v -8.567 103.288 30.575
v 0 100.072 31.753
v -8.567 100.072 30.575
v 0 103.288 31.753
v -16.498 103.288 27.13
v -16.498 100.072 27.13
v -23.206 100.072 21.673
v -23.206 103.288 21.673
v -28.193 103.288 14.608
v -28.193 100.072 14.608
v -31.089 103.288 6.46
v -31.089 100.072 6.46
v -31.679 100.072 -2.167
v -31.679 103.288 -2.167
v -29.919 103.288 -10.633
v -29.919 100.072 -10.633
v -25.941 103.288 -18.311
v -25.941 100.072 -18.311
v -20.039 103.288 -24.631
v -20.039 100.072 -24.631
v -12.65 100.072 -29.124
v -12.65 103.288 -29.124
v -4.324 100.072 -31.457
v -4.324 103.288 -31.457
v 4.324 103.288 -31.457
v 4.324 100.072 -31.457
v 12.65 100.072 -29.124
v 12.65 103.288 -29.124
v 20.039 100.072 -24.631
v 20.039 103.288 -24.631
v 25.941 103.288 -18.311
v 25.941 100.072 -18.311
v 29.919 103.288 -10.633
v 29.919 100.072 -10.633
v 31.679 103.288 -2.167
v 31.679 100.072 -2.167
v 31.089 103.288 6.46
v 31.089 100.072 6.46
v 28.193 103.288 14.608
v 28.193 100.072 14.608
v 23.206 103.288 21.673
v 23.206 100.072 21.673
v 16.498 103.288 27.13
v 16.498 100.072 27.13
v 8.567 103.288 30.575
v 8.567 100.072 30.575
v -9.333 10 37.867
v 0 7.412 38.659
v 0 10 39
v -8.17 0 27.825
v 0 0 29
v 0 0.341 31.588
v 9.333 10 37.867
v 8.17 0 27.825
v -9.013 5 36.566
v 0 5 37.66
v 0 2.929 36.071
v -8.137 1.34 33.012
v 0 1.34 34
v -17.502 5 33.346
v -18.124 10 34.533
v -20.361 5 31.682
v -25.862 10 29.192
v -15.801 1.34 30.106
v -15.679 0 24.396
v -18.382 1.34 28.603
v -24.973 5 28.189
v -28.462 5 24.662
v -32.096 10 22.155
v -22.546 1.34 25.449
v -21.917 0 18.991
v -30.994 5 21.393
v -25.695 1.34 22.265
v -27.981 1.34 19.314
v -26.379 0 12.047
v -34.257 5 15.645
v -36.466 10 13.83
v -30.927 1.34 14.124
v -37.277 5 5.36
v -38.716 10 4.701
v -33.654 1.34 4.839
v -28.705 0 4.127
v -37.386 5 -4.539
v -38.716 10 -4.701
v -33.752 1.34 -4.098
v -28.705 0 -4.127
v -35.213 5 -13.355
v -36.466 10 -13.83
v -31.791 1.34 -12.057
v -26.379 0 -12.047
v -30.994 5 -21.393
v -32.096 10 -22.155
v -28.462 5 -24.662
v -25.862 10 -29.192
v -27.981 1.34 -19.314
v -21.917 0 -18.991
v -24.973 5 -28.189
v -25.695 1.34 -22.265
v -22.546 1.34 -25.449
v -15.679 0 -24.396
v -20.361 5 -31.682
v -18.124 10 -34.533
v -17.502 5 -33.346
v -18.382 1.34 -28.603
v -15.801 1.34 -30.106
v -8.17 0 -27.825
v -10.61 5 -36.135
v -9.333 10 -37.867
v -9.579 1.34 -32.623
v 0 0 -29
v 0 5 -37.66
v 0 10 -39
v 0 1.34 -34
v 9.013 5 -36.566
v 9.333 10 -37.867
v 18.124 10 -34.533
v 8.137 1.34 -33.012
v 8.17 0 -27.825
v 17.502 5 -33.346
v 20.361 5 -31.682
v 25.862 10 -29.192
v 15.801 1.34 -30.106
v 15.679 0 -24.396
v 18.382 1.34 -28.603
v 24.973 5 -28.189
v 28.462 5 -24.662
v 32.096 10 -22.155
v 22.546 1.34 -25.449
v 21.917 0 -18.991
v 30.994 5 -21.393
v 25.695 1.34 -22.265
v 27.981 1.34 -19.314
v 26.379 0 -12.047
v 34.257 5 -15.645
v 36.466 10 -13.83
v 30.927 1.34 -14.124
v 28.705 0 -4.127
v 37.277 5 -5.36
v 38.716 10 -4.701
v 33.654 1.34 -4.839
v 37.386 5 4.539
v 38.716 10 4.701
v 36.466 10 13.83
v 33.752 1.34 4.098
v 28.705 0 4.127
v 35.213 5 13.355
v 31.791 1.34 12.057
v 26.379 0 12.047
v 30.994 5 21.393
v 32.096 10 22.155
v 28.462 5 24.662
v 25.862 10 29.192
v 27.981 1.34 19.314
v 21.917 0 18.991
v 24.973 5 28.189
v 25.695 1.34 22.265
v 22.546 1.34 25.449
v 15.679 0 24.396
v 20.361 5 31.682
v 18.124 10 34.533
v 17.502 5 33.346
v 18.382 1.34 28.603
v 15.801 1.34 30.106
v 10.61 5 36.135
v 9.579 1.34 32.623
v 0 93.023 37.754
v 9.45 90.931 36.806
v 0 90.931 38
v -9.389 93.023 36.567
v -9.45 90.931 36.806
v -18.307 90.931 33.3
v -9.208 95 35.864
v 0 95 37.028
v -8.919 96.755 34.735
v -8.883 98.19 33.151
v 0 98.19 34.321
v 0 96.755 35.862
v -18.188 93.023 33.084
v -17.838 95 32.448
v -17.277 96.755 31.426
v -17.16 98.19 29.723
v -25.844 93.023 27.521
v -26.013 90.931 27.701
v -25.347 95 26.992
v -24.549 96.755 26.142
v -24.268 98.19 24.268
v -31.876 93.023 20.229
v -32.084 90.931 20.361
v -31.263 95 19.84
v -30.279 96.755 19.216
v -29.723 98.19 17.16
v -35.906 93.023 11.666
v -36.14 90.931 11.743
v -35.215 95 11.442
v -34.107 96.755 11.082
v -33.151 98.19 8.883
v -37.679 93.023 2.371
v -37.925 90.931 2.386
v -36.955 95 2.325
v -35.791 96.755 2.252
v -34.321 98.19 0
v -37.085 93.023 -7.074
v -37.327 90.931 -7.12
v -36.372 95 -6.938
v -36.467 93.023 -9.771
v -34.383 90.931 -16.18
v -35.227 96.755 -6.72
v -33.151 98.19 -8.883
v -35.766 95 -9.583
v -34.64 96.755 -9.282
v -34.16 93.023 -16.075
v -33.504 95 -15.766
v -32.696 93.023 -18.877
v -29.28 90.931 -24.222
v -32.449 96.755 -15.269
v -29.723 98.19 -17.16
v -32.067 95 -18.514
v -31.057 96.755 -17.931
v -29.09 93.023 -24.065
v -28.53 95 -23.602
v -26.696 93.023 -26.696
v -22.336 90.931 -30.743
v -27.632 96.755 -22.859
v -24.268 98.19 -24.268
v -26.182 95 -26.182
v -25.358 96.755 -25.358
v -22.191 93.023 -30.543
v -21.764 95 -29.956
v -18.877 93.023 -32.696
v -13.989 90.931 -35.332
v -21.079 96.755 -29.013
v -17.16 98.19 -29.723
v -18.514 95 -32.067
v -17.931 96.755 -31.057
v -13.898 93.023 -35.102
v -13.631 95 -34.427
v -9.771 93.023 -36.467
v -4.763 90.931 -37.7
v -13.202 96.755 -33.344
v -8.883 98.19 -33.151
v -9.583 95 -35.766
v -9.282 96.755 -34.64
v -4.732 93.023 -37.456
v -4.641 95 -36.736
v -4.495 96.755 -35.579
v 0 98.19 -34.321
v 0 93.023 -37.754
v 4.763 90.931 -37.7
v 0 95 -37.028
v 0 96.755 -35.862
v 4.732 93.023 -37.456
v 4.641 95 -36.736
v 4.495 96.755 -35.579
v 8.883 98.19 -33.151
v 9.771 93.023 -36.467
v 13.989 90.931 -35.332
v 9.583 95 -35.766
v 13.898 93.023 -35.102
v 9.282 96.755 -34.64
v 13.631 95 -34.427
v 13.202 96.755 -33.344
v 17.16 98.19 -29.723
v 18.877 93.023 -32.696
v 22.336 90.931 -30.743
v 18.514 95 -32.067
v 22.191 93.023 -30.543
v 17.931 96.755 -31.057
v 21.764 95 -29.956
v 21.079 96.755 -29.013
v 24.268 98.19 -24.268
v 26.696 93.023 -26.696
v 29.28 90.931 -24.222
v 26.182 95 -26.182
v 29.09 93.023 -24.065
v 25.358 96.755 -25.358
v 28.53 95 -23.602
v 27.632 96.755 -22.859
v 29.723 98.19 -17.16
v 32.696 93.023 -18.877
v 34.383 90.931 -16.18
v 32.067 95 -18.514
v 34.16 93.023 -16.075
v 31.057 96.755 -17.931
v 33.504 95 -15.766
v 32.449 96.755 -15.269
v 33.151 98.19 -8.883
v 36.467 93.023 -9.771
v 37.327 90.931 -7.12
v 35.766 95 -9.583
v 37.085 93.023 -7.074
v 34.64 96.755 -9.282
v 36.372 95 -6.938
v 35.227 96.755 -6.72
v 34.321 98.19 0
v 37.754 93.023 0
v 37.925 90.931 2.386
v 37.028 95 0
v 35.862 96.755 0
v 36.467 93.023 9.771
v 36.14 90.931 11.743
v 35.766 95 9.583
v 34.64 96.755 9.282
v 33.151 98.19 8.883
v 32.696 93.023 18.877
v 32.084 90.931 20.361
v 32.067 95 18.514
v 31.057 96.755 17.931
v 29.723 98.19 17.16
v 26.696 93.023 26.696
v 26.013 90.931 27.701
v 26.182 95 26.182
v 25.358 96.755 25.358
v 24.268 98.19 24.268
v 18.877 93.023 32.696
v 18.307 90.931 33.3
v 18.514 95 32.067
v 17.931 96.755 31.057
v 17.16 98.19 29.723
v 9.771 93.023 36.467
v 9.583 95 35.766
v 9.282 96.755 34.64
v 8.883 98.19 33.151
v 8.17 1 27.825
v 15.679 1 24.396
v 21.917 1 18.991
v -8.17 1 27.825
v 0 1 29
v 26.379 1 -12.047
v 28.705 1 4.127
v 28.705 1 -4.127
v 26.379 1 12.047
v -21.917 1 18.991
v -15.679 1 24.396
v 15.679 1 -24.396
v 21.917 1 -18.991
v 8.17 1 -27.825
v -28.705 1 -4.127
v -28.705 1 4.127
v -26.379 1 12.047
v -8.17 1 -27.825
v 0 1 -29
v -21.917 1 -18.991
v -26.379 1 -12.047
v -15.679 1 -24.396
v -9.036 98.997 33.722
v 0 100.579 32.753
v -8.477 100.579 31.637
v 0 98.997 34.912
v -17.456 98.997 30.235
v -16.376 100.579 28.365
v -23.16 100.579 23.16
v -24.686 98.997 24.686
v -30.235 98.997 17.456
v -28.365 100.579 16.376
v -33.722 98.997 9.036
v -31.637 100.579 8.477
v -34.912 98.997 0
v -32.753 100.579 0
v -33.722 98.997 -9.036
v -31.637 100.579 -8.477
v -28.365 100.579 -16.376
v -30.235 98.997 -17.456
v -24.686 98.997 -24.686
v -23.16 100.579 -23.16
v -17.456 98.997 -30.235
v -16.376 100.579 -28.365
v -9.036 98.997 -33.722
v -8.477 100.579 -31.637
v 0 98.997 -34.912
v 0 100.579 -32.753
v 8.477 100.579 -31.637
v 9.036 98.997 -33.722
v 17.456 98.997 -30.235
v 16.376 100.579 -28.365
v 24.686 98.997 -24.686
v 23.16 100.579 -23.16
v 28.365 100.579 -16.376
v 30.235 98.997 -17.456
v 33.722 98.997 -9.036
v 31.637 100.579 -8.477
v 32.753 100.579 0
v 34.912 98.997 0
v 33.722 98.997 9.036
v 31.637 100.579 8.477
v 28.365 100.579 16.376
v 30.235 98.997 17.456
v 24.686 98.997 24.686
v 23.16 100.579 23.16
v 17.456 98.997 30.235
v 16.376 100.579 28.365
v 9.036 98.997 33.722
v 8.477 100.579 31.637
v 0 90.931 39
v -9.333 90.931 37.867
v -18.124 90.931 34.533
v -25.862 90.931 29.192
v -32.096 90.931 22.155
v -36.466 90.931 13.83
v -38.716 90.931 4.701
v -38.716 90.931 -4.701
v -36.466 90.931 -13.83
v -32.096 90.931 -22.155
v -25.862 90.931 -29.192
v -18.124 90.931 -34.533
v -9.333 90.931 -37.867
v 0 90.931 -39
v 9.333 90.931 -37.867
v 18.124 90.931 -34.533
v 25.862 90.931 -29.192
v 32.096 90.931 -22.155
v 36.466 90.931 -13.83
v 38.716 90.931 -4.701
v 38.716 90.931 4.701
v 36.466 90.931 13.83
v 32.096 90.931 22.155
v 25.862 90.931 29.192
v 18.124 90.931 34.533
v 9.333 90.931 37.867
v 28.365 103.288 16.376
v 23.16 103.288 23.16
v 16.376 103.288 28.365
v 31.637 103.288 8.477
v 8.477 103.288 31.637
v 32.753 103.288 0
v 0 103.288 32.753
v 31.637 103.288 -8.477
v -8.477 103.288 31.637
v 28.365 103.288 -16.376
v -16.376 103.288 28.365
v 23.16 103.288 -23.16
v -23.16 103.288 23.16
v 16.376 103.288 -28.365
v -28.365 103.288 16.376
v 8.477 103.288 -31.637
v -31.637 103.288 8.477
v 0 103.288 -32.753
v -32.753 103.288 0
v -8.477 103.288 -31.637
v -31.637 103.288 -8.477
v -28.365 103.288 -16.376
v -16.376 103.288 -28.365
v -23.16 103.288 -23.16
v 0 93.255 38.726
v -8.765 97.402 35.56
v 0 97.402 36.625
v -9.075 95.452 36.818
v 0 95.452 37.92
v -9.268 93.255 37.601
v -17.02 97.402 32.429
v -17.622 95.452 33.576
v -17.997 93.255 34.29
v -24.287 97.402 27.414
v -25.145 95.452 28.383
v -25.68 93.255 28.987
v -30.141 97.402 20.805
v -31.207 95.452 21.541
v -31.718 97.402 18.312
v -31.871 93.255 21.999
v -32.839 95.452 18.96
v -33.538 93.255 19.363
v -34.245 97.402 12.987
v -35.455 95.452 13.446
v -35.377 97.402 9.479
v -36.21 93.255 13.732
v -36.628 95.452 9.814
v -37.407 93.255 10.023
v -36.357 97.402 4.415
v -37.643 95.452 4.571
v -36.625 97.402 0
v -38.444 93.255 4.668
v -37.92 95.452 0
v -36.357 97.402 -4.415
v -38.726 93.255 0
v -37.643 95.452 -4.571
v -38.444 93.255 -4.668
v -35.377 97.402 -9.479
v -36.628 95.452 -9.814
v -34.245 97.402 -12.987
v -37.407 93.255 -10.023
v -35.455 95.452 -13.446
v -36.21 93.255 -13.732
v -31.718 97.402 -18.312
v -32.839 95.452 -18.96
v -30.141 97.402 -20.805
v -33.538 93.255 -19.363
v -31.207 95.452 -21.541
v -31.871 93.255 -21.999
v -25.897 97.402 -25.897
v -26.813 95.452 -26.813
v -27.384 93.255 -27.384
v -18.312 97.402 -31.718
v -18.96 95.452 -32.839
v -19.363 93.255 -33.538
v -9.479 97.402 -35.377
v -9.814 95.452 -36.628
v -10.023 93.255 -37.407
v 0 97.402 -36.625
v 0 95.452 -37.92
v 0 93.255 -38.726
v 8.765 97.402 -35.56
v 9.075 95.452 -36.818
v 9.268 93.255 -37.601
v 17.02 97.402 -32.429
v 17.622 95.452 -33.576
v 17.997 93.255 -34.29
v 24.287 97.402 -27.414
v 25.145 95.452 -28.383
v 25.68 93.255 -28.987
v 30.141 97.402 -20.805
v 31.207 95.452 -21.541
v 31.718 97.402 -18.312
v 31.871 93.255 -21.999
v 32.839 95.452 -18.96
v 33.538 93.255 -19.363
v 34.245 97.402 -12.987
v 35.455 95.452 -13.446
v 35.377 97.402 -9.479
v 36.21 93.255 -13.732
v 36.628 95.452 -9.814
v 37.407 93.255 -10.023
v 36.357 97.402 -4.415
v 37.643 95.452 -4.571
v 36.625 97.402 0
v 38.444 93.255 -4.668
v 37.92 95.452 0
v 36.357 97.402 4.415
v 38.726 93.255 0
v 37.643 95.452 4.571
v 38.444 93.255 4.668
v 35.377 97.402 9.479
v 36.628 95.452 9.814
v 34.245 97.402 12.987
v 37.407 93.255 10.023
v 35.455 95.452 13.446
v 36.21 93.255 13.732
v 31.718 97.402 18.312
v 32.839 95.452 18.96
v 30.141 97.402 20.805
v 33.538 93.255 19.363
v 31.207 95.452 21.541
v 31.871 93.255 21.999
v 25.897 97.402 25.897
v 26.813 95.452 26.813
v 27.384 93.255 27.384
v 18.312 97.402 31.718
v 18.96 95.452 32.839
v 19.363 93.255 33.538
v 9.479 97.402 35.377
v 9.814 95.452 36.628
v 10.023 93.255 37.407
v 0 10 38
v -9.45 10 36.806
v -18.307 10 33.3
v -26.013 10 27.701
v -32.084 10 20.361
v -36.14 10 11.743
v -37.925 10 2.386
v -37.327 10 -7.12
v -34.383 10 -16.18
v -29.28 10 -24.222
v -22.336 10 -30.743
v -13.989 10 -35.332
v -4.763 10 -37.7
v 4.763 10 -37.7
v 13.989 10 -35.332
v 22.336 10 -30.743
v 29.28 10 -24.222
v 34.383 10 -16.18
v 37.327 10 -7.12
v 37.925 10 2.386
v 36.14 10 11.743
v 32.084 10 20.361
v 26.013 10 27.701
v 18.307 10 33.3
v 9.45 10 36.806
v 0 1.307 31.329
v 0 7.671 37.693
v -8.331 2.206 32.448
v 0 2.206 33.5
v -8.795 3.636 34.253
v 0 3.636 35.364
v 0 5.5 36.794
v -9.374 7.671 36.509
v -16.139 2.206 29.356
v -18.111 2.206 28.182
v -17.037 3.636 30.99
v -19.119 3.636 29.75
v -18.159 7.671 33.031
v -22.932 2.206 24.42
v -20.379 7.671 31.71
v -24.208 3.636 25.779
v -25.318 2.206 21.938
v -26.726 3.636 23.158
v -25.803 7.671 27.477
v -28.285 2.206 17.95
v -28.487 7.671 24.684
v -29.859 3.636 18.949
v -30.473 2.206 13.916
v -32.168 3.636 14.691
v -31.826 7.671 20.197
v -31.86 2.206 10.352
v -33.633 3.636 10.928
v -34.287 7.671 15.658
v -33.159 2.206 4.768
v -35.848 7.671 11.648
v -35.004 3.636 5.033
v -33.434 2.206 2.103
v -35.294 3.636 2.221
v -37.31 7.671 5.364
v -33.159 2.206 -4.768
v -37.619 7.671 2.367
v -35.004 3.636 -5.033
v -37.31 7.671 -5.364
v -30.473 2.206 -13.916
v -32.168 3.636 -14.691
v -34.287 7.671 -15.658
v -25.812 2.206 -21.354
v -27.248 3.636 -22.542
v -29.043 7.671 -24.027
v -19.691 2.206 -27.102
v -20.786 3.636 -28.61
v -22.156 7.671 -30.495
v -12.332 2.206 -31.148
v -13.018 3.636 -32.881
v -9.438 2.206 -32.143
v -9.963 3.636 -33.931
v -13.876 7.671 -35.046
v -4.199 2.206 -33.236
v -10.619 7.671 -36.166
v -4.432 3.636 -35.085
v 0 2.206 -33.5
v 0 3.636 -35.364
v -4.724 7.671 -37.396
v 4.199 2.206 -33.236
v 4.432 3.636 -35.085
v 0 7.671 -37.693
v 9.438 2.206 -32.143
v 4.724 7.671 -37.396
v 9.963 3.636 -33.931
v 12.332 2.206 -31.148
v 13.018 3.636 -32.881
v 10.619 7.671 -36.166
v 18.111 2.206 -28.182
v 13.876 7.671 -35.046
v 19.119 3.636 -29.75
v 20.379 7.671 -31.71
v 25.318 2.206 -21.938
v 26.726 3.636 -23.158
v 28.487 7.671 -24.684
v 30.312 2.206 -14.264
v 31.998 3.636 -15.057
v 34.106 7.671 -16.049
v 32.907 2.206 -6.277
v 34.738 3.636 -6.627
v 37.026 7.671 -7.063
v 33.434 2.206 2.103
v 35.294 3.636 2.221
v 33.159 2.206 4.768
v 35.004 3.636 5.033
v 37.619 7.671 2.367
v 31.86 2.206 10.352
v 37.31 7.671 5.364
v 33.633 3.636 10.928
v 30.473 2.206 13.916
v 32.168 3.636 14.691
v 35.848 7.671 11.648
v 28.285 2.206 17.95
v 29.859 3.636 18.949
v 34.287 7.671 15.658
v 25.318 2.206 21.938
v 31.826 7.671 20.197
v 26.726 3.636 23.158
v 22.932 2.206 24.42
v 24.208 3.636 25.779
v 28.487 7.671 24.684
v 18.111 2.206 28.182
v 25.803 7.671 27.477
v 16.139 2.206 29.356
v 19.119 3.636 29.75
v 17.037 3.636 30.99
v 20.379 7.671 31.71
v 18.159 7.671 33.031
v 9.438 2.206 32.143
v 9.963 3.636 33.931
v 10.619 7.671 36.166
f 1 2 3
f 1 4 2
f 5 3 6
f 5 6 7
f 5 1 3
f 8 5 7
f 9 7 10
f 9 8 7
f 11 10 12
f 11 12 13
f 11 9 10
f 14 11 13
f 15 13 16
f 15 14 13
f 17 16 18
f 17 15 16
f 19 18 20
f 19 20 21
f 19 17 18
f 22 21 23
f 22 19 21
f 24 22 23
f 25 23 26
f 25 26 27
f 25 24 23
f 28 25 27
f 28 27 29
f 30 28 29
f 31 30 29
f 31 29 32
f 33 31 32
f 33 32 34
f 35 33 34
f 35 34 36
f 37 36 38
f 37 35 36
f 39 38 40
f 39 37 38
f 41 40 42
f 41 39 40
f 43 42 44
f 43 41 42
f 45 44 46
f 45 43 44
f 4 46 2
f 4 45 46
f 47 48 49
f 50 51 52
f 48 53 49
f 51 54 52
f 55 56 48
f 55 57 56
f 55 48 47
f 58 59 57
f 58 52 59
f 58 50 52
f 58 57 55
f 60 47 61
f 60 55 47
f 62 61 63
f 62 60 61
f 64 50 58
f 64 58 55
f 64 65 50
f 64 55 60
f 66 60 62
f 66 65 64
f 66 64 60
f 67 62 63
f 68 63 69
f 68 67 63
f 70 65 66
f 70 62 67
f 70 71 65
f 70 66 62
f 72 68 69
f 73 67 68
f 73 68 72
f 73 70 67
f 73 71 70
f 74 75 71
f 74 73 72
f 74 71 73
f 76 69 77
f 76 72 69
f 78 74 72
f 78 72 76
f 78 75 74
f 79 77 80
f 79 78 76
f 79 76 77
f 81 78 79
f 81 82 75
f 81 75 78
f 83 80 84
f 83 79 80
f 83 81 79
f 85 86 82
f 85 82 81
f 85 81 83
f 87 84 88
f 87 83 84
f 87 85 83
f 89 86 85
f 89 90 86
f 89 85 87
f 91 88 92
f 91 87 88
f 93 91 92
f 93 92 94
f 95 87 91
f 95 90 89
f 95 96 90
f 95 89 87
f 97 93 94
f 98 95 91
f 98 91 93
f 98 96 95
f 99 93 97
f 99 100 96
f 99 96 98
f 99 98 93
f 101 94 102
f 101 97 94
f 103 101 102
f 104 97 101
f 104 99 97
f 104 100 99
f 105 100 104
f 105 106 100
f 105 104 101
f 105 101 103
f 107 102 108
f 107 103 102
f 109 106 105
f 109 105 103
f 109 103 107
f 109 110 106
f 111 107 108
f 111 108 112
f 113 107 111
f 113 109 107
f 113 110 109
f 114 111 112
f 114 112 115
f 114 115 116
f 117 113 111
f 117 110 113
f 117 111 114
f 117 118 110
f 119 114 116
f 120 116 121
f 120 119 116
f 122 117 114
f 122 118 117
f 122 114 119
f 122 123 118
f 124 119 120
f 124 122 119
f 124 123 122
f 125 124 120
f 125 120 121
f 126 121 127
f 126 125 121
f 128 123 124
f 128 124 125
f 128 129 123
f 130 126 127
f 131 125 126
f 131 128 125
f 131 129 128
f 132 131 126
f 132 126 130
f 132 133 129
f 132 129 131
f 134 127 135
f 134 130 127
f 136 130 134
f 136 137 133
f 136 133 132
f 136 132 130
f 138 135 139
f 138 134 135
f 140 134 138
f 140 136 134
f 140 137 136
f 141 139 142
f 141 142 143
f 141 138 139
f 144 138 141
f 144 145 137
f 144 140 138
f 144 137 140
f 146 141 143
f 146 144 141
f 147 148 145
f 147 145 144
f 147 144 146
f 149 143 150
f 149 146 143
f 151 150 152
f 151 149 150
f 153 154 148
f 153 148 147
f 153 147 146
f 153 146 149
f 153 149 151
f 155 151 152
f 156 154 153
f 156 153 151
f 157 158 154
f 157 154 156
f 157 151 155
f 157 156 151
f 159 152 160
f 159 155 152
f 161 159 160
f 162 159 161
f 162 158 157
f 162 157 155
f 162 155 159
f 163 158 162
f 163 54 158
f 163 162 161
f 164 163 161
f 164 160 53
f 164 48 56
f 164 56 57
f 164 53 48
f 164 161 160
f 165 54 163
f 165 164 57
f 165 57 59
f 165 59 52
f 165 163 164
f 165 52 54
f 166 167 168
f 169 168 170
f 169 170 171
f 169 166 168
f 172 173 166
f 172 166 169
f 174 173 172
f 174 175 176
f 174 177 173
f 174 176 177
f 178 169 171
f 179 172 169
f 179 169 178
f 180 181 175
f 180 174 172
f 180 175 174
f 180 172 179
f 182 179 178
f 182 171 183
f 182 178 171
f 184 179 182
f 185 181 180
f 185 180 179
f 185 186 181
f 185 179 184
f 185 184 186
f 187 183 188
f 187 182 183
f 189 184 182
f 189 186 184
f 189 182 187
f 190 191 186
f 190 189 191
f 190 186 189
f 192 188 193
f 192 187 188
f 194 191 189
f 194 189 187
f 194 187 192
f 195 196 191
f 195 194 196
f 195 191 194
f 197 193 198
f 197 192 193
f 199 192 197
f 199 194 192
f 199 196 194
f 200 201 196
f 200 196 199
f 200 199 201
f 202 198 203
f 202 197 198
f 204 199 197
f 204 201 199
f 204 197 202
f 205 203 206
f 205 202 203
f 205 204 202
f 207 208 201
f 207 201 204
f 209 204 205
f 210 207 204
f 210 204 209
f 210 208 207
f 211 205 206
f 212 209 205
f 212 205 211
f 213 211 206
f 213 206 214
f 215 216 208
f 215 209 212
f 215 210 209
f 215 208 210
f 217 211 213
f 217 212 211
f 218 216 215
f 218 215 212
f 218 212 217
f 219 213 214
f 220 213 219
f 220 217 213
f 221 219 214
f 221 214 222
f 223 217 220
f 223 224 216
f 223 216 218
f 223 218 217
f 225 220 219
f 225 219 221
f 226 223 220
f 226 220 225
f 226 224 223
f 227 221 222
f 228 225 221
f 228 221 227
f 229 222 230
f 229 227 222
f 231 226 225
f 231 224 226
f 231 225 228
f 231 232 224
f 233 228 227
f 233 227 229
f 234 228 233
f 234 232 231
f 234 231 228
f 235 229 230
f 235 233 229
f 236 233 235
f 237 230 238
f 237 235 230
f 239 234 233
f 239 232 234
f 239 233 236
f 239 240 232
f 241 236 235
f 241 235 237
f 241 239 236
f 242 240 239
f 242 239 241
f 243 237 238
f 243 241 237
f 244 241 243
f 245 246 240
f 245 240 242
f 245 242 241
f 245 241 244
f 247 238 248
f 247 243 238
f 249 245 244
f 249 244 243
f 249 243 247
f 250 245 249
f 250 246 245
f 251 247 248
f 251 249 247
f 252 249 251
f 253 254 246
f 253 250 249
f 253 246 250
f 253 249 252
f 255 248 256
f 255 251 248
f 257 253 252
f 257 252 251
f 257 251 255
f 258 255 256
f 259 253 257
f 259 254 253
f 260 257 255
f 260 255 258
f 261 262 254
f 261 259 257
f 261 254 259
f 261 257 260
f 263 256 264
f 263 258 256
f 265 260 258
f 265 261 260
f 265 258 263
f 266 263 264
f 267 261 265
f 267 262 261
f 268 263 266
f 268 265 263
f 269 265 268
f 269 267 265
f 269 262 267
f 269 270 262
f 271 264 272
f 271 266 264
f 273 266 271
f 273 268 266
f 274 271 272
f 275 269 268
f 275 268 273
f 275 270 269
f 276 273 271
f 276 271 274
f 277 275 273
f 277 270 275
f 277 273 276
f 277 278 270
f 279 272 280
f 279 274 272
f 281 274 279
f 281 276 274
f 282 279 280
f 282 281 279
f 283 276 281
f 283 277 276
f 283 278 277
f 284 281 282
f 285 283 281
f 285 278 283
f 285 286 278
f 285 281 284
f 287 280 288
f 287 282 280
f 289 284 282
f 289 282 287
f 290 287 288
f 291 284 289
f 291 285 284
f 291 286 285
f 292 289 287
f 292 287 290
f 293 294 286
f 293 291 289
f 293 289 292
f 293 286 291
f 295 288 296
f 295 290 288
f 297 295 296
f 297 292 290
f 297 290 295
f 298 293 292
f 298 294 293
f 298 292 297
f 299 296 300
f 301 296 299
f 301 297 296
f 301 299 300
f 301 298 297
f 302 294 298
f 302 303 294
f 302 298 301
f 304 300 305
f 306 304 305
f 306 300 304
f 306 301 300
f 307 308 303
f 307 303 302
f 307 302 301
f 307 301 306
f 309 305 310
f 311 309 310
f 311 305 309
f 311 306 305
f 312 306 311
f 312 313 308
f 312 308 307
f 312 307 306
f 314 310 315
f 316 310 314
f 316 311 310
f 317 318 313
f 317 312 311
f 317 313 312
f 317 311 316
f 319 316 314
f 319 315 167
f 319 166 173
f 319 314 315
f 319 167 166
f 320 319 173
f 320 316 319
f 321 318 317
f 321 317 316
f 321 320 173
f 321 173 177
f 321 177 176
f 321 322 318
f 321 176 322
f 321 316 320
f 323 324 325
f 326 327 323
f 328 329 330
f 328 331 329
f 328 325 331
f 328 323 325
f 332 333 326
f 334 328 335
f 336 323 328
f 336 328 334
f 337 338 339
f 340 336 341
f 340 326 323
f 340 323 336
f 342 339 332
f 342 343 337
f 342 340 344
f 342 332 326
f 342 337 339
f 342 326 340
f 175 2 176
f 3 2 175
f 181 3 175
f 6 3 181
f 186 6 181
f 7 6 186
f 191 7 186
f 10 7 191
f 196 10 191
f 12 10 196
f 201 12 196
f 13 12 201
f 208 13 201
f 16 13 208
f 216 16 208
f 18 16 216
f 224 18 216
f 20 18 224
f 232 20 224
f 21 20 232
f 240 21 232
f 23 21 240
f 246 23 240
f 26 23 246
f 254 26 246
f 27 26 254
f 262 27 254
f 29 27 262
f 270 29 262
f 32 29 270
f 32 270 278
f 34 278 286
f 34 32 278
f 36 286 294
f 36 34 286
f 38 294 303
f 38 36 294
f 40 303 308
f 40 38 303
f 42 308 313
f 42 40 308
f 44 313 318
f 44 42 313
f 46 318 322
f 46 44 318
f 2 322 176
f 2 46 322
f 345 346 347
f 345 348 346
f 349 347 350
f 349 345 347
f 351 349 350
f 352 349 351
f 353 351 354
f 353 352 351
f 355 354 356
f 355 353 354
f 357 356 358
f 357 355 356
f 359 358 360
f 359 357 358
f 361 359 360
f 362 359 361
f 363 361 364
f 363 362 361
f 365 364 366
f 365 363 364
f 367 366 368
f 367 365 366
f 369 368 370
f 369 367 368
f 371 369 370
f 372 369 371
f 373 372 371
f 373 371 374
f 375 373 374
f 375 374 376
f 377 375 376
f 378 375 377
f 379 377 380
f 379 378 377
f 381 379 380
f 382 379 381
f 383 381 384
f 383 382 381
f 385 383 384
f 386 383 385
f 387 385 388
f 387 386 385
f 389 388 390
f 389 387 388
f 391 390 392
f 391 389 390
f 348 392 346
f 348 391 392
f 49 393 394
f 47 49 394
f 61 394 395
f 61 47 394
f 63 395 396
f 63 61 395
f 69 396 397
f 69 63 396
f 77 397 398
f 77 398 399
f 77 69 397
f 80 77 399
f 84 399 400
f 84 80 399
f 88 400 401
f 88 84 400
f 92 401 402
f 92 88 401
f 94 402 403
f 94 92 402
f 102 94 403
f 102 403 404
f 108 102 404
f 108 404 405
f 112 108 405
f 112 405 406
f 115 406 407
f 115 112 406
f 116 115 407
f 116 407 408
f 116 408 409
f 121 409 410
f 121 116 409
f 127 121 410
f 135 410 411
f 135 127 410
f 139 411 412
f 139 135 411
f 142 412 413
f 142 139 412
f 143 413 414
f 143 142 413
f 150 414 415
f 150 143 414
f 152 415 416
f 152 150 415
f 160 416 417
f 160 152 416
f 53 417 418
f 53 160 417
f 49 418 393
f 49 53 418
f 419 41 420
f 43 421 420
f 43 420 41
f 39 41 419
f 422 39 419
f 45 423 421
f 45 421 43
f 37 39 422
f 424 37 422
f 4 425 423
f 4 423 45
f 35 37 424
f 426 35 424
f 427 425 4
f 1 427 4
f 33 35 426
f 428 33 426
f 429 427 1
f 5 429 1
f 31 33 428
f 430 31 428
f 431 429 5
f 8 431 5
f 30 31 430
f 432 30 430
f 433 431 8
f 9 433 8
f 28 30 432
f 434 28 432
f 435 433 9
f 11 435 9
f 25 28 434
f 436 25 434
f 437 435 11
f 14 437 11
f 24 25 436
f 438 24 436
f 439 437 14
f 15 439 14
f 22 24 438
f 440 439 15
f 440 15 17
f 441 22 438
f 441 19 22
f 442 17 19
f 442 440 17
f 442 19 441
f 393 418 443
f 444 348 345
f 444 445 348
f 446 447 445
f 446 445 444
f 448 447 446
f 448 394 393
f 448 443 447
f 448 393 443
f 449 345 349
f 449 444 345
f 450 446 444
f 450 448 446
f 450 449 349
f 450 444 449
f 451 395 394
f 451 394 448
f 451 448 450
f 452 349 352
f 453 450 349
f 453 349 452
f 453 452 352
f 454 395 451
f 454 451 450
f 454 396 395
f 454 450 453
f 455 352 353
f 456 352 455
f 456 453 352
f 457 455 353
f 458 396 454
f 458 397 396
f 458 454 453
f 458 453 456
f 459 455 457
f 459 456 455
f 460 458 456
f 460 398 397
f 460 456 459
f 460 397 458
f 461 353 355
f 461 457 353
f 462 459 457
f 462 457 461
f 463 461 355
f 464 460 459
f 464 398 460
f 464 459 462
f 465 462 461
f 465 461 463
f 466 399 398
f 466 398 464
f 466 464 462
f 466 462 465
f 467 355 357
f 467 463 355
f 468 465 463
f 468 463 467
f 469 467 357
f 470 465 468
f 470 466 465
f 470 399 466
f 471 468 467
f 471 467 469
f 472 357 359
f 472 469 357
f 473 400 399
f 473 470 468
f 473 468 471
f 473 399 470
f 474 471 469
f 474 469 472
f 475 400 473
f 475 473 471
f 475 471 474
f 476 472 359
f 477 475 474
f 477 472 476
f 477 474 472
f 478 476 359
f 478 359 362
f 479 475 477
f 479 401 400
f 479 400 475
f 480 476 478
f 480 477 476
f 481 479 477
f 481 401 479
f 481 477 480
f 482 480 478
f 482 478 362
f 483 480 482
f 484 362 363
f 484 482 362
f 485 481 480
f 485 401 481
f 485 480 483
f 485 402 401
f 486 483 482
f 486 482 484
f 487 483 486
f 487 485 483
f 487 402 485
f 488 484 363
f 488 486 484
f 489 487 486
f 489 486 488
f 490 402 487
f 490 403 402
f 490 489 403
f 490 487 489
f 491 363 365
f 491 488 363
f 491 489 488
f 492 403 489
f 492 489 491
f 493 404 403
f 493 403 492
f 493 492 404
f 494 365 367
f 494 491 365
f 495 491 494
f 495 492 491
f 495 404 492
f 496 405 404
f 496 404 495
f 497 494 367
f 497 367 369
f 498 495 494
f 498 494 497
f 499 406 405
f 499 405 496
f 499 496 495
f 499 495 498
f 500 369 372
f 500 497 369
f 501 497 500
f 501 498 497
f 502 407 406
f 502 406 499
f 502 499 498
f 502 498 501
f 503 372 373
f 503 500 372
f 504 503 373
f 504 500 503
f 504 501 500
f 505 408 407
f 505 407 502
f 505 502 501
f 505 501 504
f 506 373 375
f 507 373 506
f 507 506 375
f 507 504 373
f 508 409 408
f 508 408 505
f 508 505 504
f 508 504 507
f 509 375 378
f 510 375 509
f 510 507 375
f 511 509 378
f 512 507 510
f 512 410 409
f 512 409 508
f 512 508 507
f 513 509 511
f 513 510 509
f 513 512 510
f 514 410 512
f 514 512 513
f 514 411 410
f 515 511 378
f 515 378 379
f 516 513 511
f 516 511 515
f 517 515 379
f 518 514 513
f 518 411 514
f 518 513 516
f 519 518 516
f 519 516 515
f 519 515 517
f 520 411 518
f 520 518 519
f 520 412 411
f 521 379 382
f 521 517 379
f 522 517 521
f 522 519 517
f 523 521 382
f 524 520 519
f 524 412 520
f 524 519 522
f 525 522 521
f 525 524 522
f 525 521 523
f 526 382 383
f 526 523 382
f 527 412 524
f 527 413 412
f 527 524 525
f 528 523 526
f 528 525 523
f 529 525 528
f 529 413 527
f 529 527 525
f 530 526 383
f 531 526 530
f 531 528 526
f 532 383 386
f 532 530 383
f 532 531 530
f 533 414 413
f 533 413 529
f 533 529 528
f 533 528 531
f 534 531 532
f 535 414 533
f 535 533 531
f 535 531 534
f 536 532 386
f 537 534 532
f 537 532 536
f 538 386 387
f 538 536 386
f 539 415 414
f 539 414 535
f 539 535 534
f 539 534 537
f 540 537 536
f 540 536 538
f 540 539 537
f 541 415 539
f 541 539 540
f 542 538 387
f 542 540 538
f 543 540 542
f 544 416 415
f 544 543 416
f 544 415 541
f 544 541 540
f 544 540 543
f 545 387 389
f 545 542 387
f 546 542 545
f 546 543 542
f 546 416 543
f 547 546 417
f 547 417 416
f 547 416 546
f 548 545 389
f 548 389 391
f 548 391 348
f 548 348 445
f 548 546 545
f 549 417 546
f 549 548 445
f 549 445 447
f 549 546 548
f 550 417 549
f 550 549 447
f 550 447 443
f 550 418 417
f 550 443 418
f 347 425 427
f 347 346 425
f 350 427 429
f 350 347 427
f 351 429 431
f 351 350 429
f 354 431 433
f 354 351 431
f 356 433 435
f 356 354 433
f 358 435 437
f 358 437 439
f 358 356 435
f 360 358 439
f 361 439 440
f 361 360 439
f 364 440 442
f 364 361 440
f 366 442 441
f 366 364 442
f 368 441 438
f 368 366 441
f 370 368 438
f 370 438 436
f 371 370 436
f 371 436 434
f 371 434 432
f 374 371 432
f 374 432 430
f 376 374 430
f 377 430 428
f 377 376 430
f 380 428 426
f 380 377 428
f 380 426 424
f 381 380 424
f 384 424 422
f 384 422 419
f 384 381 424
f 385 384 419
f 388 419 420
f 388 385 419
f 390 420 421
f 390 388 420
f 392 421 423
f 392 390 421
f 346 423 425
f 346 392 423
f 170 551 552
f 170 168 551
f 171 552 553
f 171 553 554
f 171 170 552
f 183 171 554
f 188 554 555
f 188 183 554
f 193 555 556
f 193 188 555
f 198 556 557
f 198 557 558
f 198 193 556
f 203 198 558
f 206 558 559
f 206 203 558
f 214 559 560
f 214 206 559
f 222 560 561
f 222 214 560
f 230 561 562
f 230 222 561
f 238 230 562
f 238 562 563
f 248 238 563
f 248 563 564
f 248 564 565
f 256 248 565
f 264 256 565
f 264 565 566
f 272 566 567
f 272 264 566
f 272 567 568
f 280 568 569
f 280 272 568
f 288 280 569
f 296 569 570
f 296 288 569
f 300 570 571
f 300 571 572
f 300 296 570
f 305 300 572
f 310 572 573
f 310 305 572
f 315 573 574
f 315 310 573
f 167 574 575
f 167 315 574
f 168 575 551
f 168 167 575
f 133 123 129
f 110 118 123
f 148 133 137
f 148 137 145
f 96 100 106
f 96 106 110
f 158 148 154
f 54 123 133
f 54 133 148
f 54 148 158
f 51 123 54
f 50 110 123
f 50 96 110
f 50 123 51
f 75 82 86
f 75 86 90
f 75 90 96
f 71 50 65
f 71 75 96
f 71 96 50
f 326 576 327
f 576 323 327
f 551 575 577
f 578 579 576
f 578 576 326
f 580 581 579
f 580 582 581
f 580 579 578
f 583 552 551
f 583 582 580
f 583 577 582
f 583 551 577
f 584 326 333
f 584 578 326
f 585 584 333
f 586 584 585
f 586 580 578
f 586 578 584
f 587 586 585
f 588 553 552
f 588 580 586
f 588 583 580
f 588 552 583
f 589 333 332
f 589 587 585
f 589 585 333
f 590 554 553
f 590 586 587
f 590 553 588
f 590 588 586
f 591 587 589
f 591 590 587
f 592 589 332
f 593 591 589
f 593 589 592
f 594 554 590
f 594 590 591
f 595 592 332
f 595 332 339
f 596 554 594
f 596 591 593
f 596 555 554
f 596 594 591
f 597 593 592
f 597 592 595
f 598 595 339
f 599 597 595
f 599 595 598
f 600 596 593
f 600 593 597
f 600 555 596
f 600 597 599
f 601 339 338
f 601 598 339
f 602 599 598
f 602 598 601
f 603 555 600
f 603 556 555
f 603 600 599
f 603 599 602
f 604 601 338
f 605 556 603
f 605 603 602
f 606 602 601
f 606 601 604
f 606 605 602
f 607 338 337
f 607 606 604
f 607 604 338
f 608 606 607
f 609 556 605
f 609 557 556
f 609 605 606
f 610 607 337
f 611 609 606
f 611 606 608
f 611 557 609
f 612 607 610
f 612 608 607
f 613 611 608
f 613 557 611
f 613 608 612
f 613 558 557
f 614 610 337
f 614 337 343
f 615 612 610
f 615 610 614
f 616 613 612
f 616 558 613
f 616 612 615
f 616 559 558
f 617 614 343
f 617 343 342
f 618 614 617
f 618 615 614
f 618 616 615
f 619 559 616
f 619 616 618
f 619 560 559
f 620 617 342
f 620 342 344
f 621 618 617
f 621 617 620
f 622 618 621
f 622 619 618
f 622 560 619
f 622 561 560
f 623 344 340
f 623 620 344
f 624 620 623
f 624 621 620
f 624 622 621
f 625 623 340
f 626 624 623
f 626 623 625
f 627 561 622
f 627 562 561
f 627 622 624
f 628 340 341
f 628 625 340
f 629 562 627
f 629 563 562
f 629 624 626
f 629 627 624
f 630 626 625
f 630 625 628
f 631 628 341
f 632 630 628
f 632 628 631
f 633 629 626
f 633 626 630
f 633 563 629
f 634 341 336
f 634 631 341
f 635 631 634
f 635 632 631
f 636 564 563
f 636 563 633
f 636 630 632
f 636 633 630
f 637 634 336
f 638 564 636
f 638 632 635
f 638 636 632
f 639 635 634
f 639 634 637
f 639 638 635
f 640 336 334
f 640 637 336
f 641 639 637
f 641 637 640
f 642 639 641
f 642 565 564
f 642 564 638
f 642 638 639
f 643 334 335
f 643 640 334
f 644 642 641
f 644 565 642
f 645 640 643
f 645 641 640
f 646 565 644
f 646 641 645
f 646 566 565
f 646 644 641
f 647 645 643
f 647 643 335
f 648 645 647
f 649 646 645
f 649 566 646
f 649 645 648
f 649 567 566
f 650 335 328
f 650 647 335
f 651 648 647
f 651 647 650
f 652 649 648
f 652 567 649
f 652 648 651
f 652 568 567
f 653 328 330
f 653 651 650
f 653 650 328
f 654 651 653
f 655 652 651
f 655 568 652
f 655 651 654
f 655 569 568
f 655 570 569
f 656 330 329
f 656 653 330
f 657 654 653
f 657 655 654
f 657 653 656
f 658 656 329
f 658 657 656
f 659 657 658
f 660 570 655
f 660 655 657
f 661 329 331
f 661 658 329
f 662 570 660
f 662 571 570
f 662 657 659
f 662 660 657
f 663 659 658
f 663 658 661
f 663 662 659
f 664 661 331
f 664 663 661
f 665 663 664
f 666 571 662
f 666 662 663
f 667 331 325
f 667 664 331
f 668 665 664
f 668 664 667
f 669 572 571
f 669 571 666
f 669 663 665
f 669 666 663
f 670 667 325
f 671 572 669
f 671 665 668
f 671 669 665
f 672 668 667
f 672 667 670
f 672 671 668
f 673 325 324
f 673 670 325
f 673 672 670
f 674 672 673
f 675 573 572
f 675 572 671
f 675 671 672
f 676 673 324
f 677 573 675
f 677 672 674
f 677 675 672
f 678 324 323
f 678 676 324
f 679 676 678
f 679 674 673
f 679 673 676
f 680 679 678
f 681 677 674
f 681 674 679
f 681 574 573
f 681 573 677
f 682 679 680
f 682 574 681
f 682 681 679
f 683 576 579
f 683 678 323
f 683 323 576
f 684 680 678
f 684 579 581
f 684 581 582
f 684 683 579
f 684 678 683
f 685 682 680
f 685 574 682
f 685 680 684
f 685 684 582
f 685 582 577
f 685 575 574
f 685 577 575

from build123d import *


with BuildPart() as part:
    # Sketch1 → Revolve1 (revolve)
    with BuildSketch(Plane.XY, mode=Mode.PRIVATE) as revolve1_sk:
        with BuildLine():
            Line((39, 90.931199499), (39, 10))
            ThreePointArc((39, 10), (36.071067812, 2.928932188), (29, 0))
            Line((29, 0), (0, 0))
            Line((0, 0), (0, 1))
            Line((0, 1), (29, 1))
            ThreePointArc((29, 1), (35.363961031, 3.636038969), (38, 10))
            Line((38, 10), (38, 90.931199499))
            ThreePointArc((38, 90.931199499), (37.027631255, 95.000245632), (34.320636349, 98.190044369))
            Line((34.320636349, 98.190044369), (31.752687074, 100.072316893))
            Line((31.752687074, 100.072316893), (31.752687074, 103.288460274))
            Line((31.752687074, 103.288460274), (32.752687074, 103.288460274))
            Line((32.752687074, 103.288460274), (32.752687074, 100.579196943))
            Line((32.752687074, 100.579196943), (34.911818166, 98.996582688))
            ThreePointArc((34.911818166, 98.996582688), (37.919590284, 95.452361869), (39, 90.931199499))
        make_face()
    revolve(revolve1_sk.sketch.rotate(Axis((0, 85.763888889, 0), (0, -1, 0)), 90), axis=Axis((0, 85.763888889, 0), (0, -1, 0)))


solid = part.part
